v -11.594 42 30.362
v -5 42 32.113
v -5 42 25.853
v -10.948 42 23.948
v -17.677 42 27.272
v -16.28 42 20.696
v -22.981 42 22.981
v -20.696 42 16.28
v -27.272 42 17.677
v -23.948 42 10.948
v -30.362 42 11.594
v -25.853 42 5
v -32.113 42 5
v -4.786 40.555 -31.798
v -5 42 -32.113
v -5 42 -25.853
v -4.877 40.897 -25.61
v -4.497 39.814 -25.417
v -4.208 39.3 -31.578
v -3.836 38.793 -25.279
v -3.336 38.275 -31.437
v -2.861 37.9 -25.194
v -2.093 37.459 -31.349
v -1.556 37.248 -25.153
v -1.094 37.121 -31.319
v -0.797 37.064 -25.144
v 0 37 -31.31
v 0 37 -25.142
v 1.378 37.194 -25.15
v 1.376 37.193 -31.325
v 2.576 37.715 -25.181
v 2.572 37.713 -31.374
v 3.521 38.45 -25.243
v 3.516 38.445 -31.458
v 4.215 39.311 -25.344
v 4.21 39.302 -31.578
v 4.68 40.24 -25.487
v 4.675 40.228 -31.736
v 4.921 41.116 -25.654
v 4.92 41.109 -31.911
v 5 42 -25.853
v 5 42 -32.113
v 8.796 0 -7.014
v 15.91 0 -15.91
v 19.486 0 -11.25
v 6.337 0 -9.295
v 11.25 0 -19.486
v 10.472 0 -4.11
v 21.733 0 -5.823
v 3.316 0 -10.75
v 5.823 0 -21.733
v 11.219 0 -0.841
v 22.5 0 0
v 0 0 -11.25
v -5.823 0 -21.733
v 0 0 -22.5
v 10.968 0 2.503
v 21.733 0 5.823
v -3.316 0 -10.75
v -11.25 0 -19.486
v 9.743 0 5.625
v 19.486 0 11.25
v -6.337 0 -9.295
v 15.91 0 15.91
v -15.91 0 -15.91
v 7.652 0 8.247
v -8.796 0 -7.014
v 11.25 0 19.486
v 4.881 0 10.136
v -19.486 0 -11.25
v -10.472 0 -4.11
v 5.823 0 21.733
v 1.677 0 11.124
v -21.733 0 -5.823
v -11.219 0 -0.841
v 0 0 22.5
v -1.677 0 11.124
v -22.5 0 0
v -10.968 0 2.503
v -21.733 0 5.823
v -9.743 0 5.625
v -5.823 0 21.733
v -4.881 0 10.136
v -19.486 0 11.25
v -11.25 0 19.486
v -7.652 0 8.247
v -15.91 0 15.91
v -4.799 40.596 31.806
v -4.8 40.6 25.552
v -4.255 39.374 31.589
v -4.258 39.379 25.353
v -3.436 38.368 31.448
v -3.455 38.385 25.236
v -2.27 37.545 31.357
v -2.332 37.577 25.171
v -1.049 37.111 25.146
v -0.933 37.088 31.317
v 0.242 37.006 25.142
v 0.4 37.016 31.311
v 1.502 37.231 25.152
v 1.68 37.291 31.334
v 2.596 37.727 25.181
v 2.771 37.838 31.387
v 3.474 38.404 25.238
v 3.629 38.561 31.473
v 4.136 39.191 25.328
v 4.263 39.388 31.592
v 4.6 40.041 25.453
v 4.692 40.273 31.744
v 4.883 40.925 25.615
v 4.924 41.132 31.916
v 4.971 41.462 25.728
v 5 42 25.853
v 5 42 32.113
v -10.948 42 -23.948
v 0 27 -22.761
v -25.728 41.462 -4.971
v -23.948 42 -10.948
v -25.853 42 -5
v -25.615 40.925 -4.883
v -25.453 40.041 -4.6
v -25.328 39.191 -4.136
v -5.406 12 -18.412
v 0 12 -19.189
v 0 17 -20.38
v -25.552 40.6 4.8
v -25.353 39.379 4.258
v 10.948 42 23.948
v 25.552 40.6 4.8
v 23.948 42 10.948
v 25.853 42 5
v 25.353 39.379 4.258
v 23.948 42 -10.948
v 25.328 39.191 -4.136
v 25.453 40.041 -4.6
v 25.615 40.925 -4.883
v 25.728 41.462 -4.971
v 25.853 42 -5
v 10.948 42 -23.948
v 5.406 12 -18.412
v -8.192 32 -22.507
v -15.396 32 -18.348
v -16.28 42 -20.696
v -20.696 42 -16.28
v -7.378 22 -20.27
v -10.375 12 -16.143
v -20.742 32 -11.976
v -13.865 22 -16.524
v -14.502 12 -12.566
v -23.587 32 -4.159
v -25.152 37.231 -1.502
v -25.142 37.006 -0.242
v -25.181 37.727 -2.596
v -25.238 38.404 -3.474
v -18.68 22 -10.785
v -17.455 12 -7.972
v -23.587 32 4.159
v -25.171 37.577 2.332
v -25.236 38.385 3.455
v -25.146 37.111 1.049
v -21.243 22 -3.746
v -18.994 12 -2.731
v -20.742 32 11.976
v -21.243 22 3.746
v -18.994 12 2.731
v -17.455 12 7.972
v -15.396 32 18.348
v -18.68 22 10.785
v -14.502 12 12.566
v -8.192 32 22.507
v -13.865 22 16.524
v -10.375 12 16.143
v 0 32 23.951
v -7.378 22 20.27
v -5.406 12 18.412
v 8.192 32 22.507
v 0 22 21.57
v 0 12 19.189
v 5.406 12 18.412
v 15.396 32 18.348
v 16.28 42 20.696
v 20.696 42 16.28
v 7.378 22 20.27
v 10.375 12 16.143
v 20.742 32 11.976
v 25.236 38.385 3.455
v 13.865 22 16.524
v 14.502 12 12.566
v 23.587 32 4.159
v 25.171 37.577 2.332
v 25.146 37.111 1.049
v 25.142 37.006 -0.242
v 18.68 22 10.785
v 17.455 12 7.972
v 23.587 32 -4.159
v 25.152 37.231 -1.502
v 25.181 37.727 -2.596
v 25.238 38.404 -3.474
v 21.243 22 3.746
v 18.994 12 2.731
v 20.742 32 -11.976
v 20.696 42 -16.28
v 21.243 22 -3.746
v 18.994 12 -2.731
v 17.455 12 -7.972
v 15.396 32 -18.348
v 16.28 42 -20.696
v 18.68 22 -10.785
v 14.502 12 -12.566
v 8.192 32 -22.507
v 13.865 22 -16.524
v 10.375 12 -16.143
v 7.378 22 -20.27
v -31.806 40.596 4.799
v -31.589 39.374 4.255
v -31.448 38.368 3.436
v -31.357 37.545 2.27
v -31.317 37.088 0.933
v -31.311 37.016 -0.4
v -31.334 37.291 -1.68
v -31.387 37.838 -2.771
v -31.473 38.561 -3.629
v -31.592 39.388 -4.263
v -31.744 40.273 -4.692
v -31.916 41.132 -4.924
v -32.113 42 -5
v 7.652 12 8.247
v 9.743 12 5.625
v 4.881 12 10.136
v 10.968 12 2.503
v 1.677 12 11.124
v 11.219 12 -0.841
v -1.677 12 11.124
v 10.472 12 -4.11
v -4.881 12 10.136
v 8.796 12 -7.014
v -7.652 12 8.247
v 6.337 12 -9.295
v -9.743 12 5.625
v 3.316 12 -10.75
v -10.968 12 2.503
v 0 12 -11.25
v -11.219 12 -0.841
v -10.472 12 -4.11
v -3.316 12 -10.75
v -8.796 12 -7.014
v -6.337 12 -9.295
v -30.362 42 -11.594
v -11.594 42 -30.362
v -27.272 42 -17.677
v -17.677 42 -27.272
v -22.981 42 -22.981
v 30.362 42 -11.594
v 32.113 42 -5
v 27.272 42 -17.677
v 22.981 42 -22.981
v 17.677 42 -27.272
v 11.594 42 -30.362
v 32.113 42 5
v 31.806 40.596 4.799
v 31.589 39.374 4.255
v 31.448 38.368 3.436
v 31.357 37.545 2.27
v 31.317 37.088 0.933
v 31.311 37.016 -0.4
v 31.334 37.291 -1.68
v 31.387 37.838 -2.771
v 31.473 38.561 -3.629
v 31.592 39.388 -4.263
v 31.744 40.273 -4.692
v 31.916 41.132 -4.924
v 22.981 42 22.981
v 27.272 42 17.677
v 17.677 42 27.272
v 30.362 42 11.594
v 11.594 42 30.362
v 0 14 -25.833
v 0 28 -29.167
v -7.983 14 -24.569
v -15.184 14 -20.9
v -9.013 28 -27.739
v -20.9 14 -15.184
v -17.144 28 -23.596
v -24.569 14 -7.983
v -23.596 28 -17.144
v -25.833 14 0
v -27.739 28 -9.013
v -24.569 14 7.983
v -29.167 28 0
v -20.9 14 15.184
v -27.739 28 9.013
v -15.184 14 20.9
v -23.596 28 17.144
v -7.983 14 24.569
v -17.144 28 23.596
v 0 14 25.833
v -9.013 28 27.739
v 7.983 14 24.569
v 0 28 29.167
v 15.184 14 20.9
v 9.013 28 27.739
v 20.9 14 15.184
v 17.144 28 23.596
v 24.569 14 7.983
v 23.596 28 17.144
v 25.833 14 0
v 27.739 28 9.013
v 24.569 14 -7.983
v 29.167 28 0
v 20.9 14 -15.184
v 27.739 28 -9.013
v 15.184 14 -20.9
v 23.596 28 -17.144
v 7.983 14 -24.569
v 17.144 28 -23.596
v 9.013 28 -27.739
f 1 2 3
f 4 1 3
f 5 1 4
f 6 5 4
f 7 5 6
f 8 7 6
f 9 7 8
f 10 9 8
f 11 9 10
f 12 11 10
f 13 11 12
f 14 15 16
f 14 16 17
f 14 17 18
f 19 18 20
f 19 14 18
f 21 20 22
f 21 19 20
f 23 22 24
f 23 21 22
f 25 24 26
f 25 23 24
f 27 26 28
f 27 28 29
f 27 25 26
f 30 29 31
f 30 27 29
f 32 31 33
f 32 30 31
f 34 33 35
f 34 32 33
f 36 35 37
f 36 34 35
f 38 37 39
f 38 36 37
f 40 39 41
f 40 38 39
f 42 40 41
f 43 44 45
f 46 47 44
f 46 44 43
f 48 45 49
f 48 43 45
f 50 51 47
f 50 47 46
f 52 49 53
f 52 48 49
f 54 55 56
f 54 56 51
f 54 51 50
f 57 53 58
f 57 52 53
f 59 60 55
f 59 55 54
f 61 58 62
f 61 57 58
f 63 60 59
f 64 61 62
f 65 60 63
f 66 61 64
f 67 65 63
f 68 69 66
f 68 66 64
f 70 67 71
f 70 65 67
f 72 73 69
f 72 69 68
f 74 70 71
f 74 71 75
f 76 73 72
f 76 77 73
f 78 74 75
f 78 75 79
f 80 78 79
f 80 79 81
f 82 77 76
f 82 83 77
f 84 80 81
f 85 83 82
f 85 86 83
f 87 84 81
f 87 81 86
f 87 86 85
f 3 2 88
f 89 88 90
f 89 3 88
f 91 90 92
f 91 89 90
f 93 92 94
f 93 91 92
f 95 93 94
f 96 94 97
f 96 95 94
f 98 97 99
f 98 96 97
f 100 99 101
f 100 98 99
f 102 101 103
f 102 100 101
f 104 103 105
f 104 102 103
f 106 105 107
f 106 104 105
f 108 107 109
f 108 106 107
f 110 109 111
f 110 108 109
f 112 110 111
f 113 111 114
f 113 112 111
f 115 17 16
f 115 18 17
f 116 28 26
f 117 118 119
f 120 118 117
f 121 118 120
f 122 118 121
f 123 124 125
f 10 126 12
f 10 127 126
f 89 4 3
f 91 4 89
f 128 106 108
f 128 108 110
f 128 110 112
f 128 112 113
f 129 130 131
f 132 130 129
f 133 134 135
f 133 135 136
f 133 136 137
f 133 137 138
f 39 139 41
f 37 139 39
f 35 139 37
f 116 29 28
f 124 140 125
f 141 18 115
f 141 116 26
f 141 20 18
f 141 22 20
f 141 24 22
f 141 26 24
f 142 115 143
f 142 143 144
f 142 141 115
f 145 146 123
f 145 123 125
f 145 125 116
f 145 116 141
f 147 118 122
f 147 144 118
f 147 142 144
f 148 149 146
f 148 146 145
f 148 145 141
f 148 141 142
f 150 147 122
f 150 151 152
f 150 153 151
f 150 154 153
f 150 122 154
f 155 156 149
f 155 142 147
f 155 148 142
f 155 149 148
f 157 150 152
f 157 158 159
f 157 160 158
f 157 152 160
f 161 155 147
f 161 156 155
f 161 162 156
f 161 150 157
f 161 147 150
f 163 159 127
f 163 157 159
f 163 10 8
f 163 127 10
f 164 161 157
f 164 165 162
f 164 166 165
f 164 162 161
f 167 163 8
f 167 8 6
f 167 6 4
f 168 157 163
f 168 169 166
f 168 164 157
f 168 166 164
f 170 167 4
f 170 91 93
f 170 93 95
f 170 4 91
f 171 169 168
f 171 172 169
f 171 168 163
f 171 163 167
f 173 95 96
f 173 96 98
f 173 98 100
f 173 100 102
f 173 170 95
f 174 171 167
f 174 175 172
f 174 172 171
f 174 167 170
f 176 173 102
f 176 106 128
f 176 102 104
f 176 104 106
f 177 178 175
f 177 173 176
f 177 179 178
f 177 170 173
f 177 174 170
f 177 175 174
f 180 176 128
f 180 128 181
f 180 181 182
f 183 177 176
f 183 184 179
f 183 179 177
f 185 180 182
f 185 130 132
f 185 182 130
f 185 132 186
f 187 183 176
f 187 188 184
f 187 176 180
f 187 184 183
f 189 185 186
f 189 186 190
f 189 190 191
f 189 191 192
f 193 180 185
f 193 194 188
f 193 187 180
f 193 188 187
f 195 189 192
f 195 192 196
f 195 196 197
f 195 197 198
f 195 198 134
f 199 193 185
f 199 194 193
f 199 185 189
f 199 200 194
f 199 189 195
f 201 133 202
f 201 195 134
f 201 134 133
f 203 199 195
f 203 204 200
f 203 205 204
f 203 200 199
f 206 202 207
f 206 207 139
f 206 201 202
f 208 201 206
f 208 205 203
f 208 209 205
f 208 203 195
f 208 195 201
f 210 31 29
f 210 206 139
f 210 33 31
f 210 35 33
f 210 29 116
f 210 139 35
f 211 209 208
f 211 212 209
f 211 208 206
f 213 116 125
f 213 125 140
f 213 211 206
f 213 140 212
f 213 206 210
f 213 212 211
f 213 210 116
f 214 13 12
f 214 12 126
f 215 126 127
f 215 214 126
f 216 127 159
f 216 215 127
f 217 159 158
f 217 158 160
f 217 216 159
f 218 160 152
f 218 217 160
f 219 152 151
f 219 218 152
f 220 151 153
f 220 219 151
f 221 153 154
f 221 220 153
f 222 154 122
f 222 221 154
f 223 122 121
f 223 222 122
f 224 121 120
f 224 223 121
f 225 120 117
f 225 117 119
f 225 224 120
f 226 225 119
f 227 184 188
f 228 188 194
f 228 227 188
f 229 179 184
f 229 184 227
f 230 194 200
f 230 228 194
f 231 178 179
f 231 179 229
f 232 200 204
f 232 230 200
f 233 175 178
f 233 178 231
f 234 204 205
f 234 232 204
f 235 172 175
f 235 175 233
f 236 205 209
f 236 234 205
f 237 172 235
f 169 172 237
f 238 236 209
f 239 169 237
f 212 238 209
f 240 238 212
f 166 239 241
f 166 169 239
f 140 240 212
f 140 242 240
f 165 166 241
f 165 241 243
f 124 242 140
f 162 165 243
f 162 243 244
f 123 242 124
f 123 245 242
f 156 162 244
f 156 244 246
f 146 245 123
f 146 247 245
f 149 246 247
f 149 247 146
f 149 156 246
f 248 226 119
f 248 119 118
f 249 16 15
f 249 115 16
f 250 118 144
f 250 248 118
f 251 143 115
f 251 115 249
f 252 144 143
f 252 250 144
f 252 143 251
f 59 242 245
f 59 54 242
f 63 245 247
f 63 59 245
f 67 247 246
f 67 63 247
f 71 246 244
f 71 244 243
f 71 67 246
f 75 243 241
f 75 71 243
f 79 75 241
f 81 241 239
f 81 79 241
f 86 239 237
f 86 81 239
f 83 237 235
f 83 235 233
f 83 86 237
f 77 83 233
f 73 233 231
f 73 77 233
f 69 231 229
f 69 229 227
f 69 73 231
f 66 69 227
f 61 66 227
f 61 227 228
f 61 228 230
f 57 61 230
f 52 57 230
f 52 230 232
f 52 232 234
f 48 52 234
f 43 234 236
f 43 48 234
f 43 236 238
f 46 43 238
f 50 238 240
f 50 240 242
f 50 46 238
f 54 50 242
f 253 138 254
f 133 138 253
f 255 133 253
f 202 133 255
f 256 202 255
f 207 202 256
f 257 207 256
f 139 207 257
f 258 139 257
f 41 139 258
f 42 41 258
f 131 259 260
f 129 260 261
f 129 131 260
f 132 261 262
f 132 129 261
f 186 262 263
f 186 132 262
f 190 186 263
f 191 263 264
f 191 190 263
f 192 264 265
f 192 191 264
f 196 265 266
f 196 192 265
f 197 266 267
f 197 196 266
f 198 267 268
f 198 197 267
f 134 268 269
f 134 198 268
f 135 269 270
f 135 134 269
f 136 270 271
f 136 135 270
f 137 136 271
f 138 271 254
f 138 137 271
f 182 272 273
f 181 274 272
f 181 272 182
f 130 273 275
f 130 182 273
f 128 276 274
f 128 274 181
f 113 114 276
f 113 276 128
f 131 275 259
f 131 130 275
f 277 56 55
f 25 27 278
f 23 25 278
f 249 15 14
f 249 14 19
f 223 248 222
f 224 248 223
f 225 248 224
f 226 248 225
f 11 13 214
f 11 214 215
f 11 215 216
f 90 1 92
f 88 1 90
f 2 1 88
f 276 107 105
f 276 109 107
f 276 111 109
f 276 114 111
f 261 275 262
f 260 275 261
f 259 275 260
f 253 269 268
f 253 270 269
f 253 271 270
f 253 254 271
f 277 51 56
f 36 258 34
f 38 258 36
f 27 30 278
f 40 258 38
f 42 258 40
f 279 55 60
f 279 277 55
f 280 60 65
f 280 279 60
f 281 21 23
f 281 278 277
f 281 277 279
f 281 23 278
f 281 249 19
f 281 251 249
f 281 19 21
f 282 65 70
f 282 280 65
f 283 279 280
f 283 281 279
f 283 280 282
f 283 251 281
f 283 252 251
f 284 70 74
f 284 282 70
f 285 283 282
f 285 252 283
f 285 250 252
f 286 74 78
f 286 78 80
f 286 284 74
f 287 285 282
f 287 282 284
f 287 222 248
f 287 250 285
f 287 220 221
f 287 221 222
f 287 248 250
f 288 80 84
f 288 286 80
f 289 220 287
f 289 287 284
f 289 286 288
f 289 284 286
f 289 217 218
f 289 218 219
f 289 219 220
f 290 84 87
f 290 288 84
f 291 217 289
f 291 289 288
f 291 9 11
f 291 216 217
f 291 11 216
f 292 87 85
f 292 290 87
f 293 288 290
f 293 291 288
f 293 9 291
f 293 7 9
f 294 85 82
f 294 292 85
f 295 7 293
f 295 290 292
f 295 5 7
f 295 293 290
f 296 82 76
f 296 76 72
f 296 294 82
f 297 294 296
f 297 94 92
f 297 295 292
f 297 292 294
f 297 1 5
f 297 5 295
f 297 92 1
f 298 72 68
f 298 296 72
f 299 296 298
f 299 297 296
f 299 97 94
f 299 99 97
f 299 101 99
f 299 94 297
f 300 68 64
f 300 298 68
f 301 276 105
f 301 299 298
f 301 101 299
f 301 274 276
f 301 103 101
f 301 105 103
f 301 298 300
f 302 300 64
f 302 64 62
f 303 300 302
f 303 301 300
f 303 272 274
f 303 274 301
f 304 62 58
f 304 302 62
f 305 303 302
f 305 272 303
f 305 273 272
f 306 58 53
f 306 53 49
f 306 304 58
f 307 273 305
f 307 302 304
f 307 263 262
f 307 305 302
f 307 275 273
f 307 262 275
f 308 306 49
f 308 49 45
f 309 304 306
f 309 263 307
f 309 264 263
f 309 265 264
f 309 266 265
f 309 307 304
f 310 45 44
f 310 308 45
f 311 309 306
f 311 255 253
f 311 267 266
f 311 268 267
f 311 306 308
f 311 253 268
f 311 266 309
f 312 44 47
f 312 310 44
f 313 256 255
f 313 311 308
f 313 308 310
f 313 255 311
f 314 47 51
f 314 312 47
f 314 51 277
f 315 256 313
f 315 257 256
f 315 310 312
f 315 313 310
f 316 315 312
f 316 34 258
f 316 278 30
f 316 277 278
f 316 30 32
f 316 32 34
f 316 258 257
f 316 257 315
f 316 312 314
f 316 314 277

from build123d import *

# Parameters (mm, degrees)
CUT_EXTRUDE1_DEPTH      = 63.261545114
CUT_EXTRUDE1_DEPTH_BACK = 63.261545114
SKETCH3_R               = 5
CUT_EXTRUDE2_DEPTH      = 63.060454569
CUT_EXTRUDE2_DEPTH_BACK = 63.060454569
SKETCH4_R               = 5


with BuildPart() as part:
    # Sketch2 → Revolve1 (revolve)
    with BuildSketch(Plane.XY, mode=Mode.PRIVATE) as revolve1_sk:
        Polygon((11.25, 0), (22.5, 0), (32.5, 42), (26.332276244, 42), (19.189419101, 12), (11.25, 12), align=None)
    revolve(revolve1_sk.sketch.rotate(Axis((0, 0, 0), (0, 1, 0)), 90), axis=Axis((0, 0, 0), (0, 1, 0)))

    # Sketch3 → Cut-Extrude1 (cut, two sides: drawn at the far end of the back side and taken through both)
    with BuildSketch(Plane(origin=(0, 0, 0), x_dir=(0, 0, -1), z_dir=(1, 0, 0)).offset(-CUT_EXTRUDE1_DEPTH_BACK)):
        with Locations((0, 42)):
            Circle(SKETCH3_R)
    extrude(amount=CUT_EXTRUDE1_DEPTH + CUT_EXTRUDE1_DEPTH_BACK, mode=Mode.SUBTRACT)

    # Sketch4 → Cut-Extrude2 (cut, two sides: drawn at the far end of the back side and taken through both)
    with BuildSketch(Plane.XY.offset(-CUT_EXTRUDE2_DEPTH_BACK)):
        with Locations((0, 42)):
            Circle(SKETCH4_R)
    extrude(amount=CUT_EXTRUDE2_DEPTH + CUT_EXTRUDE2_DEPTH_BACK, mode=Mode.SUBTRACT)


solid = part.part
